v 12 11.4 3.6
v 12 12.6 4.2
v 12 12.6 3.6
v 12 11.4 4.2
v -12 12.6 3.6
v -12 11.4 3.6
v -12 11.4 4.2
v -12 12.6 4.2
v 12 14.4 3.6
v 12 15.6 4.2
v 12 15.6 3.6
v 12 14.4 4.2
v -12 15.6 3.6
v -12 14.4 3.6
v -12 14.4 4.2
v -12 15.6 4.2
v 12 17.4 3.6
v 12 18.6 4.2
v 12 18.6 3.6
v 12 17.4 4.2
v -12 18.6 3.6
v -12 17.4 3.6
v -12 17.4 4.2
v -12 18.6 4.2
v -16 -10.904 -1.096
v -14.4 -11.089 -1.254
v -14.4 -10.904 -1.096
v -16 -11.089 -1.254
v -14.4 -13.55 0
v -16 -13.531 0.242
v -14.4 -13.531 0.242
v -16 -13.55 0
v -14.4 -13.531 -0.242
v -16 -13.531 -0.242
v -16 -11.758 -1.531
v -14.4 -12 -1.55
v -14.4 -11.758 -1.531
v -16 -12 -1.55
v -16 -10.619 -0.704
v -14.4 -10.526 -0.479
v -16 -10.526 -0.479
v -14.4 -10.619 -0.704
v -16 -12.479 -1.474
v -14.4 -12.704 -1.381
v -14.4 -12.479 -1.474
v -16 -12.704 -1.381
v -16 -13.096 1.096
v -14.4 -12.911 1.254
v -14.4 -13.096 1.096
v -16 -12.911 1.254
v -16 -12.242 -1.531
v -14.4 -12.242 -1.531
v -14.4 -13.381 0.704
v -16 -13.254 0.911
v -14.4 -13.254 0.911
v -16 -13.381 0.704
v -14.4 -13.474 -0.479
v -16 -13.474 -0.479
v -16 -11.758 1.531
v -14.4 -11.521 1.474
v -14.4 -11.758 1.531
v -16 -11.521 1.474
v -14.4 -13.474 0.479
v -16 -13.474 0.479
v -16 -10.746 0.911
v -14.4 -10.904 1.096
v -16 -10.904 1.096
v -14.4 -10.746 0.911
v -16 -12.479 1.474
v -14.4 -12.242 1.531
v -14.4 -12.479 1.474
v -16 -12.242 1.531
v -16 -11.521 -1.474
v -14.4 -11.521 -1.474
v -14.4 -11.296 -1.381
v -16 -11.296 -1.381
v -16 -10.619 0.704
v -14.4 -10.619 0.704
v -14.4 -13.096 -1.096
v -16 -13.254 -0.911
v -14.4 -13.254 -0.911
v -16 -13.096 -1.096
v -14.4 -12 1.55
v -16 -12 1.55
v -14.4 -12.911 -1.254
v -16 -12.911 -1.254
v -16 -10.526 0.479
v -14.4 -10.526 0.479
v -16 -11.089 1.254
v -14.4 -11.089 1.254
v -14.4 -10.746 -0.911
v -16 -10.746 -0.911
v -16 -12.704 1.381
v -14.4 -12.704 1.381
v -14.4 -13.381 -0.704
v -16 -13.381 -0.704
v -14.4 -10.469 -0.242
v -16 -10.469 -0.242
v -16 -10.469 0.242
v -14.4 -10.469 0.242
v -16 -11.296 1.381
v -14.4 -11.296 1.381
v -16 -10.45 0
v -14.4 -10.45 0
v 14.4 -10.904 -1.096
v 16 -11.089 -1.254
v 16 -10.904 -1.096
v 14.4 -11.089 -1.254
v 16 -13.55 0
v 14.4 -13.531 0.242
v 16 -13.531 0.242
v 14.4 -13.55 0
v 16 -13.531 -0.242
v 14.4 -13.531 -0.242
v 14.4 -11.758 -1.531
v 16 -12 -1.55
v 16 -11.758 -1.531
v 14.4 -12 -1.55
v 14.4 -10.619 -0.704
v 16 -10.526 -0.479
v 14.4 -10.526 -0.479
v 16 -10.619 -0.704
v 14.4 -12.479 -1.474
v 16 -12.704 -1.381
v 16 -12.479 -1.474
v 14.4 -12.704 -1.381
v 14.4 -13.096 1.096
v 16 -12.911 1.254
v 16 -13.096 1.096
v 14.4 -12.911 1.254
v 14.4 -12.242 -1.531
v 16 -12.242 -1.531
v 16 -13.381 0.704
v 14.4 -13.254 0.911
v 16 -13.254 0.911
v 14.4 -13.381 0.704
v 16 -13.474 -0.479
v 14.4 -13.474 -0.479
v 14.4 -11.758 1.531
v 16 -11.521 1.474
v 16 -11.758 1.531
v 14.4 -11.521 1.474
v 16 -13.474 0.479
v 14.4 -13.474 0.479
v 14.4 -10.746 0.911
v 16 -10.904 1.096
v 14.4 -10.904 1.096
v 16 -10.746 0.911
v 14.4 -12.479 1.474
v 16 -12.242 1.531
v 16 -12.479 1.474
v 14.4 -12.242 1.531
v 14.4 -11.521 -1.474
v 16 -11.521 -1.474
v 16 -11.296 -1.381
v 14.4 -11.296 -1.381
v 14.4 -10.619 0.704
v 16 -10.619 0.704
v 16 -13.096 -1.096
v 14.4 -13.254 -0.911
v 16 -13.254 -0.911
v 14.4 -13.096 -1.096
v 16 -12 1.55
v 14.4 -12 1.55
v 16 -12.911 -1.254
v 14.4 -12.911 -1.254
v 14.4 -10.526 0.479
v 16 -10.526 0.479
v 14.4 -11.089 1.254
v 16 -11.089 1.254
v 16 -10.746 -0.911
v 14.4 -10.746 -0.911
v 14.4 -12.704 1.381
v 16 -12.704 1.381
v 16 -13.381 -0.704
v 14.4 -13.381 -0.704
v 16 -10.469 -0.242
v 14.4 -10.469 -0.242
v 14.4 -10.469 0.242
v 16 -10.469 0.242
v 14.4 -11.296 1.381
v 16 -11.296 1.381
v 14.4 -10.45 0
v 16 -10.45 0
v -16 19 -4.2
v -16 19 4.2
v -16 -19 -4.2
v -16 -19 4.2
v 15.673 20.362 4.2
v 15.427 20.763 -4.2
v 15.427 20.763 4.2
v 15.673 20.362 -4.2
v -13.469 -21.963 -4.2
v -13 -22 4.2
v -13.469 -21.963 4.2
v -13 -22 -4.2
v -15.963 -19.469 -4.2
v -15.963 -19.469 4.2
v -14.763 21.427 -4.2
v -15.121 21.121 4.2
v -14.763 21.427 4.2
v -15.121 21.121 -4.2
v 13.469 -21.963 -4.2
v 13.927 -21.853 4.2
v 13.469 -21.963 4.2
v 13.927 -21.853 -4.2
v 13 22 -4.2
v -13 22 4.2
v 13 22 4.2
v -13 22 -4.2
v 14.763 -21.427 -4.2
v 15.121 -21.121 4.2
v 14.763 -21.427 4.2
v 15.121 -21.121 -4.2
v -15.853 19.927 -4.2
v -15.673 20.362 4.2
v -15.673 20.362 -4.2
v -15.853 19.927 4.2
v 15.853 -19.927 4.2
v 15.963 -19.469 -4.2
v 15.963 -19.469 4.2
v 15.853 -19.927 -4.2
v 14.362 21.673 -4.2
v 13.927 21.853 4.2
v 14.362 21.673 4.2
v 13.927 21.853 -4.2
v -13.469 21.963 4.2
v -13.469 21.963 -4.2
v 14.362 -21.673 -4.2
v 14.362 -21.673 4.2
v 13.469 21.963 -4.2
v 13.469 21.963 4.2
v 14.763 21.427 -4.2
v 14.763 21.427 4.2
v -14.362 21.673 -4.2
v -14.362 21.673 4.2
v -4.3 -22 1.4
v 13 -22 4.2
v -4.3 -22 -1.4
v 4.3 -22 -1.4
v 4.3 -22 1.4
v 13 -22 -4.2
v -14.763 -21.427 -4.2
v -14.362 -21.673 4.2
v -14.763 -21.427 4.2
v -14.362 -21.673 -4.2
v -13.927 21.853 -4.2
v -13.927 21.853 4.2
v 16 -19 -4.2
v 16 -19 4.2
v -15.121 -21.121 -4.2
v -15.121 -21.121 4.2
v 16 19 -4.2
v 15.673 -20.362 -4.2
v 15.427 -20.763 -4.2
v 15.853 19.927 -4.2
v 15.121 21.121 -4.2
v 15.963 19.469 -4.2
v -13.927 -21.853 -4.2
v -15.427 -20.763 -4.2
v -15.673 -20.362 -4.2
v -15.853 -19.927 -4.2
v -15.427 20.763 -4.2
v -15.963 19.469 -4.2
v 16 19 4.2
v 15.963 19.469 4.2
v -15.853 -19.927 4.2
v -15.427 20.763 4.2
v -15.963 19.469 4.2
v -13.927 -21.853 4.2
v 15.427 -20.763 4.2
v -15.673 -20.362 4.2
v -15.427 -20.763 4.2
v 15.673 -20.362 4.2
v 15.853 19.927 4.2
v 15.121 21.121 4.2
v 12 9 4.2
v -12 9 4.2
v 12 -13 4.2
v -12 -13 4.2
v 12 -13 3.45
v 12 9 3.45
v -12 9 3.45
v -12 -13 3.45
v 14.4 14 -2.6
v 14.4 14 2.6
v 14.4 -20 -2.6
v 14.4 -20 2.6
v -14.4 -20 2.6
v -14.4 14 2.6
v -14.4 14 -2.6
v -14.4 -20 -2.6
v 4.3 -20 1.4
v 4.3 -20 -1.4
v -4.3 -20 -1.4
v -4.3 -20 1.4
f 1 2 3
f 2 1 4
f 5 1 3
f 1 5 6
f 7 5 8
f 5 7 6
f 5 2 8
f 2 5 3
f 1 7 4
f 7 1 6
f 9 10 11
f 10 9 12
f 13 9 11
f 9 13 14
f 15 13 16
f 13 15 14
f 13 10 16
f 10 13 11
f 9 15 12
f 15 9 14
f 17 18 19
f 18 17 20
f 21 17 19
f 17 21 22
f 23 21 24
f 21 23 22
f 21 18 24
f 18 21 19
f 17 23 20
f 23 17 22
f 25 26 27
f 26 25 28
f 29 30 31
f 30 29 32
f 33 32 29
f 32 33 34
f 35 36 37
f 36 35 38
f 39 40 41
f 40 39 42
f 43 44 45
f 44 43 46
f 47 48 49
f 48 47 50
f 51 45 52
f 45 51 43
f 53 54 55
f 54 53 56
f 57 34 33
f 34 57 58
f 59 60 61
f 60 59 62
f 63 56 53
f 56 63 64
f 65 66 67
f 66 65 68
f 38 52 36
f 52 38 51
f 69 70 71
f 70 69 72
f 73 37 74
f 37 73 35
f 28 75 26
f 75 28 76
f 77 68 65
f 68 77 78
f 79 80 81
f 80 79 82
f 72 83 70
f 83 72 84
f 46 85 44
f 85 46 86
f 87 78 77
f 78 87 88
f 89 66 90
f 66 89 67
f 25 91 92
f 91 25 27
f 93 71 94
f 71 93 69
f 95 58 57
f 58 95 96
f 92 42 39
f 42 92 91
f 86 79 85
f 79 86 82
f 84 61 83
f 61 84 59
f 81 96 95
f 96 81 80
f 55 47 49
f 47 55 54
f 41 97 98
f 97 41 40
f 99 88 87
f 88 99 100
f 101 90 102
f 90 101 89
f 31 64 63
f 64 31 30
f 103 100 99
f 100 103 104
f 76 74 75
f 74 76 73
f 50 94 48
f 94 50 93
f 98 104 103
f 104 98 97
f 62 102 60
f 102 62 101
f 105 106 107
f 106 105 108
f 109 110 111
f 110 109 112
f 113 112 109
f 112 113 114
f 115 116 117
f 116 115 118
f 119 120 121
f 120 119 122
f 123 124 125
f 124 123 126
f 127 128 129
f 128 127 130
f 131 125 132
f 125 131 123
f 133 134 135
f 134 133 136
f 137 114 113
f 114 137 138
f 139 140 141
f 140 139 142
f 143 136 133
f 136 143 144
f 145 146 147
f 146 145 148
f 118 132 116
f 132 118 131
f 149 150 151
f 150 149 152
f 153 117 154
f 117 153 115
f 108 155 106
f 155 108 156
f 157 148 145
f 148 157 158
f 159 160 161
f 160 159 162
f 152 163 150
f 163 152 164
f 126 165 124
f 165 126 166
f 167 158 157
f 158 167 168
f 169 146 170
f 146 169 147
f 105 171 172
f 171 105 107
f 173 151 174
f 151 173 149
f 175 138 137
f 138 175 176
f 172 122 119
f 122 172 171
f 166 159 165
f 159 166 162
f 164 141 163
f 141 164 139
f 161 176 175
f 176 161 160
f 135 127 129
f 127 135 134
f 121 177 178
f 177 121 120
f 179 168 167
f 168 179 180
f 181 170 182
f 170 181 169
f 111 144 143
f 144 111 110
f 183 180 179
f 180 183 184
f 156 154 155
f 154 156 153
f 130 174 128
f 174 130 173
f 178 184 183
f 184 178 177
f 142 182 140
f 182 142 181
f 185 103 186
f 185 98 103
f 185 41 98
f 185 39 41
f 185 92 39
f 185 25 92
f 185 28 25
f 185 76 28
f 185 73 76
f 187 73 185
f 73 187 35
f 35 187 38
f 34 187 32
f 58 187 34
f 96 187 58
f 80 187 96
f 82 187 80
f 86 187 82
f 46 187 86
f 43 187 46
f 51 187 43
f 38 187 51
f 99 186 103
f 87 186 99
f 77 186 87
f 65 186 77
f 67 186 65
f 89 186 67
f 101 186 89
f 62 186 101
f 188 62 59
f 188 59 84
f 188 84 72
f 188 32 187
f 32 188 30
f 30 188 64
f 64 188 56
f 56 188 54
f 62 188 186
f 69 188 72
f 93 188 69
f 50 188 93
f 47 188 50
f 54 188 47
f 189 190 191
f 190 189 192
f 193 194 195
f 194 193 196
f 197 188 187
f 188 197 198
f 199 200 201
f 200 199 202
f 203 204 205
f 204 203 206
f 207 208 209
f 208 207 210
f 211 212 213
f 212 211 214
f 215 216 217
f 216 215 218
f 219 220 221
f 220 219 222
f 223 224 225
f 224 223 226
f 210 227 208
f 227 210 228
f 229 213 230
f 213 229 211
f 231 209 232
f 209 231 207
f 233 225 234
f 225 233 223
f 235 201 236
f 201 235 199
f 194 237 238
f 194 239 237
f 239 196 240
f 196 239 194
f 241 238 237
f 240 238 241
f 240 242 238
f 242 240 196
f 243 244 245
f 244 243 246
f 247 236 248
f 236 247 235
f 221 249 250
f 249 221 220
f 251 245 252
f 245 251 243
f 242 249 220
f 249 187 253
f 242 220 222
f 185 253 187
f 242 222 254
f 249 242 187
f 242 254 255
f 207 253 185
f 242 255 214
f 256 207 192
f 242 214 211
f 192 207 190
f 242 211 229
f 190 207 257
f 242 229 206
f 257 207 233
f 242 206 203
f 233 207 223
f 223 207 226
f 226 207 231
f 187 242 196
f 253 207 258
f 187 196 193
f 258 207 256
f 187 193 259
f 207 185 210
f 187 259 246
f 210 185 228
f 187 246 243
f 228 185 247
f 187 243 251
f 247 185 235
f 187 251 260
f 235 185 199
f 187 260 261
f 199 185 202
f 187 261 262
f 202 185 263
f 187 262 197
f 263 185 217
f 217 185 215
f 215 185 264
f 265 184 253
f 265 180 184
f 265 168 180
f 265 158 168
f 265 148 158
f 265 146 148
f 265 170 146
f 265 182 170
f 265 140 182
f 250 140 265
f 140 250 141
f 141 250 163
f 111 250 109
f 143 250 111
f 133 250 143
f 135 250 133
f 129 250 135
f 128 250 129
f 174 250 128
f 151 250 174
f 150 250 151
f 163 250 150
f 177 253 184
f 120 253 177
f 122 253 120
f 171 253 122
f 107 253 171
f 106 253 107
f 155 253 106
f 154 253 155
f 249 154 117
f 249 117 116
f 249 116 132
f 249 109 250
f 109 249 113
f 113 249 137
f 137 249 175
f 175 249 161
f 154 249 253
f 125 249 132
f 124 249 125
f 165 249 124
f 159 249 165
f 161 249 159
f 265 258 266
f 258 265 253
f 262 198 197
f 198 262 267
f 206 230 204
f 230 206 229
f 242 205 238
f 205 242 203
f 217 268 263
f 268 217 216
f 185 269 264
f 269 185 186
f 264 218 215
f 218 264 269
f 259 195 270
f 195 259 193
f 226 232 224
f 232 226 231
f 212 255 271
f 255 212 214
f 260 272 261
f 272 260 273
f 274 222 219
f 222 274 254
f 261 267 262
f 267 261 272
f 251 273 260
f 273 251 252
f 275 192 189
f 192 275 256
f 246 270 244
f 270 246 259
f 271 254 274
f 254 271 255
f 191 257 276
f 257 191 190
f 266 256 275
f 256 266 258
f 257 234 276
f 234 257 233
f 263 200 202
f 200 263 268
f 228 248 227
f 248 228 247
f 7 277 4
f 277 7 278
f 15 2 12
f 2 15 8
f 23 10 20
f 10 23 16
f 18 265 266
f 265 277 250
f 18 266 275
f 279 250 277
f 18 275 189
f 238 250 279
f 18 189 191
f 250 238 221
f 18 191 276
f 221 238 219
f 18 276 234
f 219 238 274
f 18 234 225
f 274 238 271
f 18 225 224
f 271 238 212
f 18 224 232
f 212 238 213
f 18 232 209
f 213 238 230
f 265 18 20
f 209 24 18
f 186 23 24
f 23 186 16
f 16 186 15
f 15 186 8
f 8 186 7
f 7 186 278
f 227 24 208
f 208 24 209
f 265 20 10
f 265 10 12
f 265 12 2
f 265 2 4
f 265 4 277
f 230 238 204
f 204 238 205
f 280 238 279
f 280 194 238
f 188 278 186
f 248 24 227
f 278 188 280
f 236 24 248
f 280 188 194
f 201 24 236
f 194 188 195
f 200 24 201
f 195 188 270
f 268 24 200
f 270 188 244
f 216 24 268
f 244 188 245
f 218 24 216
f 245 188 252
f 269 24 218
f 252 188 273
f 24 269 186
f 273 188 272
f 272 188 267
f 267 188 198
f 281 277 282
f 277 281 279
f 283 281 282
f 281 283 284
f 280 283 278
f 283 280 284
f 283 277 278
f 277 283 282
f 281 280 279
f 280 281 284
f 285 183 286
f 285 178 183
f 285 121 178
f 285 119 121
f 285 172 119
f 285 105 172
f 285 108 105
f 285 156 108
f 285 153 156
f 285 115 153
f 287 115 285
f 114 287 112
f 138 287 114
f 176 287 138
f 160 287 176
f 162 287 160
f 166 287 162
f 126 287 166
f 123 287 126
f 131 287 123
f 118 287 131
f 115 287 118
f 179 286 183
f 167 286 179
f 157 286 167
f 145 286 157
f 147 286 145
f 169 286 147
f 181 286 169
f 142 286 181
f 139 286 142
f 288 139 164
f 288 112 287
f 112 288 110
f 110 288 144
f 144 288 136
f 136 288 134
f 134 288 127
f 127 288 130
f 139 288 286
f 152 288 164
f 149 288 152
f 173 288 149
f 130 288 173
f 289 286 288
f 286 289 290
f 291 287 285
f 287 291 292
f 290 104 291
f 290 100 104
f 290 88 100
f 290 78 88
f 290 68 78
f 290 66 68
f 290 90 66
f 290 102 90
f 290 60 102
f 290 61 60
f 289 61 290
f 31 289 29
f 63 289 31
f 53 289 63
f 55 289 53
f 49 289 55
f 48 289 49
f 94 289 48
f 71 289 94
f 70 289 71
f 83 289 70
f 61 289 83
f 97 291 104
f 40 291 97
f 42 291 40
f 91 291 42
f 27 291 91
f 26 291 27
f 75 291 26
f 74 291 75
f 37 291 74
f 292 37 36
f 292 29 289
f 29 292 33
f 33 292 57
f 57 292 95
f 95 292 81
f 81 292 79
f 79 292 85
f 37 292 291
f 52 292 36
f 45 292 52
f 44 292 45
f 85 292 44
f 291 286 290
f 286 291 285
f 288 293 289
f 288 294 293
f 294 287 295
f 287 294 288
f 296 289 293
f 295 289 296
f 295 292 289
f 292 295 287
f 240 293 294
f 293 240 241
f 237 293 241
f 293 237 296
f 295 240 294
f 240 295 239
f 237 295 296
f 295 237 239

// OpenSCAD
// Parallel Season FC — Removable Profile Cartridge Shell (`PSFC-CART-V1`)
// Dimensions: 44 mm tall x 32 mm wide x 8.4 mm thick, recessed club crest badge + USB-C tongue aperture

$fn = 40;

cart_w = 32.0;
cart_h = 44.0;
cart_d = 8.4;
wall   = 1.6;

module cartridge_body() {
    difference() {
        hull() {
            for (sx = [-1, 1], sy = [-1, 1]) {
                translate([sx * (cart_w/2 - 3.0), sy * (cart_h/2 - 3.0), 0])
                    cylinder(h = cart_d, r = 3.0, center = true);
            }
        }

        // Top grip ribs
        for (ry = [12, 15, 18]) {
            translate([0, ry, cart_d/2])
                cube([cart_w - 8.0, 1.2, 1.2], center = true);
        }

        // Recessed front club crest & participant label pocket
        translate([0, -2, cart_d/2 - 0.35])
            cube([24.0, 22.0, 0.8], center = true);

        // Internal flash carrier PCB cavity
        translate([0, -3.0, 0])
            cube([cart_w - 2*wall, cart_h - 10.0, cart_d - 2*wall], center = true);

        // Bottom USB-C male plug tongue opening
        translate([0, -cart_h/2 + 2.0, 0])
            cube([8.6, 8.0, 2.8], center = true);

        // Side magnetic detent pockets (3mm x 1.5mm N52 magnets)
        for (sx = [-1, 1]) {
            translate([sx * (cart_w/2 - 0.8), -12.0, 0])
                rotate([0, 90, 0])
                cylinder(h = 1.7, r = 1.55, center = true);
        }
    }
}

cartridge_body();
